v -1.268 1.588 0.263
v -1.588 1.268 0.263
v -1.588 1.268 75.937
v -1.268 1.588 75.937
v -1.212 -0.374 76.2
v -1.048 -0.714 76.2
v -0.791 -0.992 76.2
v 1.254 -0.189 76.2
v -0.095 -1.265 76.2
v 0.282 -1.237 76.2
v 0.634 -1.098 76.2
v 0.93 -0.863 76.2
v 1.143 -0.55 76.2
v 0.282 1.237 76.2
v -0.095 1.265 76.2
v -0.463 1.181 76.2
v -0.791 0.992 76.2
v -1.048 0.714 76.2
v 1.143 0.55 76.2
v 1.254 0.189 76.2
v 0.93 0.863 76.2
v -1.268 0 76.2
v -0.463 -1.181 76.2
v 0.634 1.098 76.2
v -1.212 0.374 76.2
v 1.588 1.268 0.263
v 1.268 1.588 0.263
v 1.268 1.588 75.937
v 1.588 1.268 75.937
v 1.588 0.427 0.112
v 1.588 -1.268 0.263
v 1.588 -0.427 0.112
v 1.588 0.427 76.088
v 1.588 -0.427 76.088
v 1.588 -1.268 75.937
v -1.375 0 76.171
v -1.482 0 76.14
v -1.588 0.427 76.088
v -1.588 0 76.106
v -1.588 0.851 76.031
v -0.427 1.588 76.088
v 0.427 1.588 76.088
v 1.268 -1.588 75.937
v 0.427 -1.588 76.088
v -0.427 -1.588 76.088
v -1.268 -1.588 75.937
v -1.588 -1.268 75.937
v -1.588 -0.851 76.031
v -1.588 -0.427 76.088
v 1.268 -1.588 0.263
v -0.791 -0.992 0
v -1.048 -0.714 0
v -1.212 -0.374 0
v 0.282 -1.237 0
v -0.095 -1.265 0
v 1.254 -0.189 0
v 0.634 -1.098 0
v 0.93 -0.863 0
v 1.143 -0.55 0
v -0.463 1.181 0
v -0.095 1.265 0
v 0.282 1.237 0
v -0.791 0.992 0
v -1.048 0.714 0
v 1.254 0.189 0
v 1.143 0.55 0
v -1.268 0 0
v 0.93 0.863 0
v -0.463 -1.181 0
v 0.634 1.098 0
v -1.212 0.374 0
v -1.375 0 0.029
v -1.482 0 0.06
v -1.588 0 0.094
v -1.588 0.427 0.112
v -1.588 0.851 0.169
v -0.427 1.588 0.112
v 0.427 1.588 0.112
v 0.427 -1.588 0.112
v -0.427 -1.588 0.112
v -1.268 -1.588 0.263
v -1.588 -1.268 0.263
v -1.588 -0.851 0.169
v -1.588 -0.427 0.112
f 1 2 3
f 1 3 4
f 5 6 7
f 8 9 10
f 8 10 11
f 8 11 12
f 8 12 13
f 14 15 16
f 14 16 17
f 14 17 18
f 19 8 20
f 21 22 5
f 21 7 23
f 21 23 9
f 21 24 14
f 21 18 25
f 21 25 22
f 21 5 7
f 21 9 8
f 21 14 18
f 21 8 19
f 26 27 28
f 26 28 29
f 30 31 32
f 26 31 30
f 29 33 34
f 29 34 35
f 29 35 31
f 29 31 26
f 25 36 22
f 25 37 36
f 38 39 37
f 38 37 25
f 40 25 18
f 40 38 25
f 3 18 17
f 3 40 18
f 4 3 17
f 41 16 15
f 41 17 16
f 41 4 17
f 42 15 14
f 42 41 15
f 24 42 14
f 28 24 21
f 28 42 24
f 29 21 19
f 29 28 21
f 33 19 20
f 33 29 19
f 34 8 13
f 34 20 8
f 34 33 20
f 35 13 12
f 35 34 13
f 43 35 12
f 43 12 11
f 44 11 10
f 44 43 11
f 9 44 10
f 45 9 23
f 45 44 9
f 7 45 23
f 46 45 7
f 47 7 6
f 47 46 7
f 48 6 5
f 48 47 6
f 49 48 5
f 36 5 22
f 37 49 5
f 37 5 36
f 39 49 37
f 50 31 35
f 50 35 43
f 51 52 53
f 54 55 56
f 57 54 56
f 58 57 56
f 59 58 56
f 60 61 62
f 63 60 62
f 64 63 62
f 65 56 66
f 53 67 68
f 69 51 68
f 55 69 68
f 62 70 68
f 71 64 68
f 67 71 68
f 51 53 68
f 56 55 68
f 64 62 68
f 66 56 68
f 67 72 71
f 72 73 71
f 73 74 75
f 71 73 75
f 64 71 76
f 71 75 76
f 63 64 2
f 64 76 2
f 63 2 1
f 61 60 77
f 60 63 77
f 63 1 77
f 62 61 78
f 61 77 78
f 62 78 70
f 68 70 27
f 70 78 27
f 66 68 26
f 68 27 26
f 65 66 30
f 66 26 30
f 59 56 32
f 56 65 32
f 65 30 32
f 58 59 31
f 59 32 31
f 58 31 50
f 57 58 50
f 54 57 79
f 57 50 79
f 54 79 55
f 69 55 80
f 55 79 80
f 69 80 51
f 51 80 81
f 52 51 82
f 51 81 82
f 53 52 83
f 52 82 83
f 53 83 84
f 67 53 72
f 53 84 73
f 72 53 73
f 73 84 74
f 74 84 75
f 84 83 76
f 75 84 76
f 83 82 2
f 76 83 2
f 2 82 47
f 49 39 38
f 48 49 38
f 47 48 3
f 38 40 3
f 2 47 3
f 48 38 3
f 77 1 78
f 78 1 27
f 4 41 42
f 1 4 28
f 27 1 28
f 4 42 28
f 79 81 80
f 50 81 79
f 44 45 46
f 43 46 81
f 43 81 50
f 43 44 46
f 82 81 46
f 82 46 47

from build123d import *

# Parameters (mm, degrees)
SKETCH1_W           = 3.175
SKETCH1_H           = 3.175
BOSS_EXTRUDE1_DEPTH = 38.1
SKETCH2_OUTSIDE_W   = 12.848
SKETCH2_OUTSIDE_H   = 12.847
SKETCH2_OUTSIDE_R   = 2.032
CUT_EXTRUDE1_DEPTH  = 39.1


with BuildPart() as part:
    # Sketch1 → Boss-Extrude1 (new body)
    with BuildSketch(Plane.XY):
        Rectangle(SKETCH1_W, SKETCH1_H)
    extrude(amount=BOSS_EXTRUDE1_DEPTH)

    # Sketch2 outside → Cut-Extrude1 (cut, through all)
    with BuildSketch(Plane(origin=(0, 0, 0), x_dir=(-1, 0, 0), z_dir=(0, 0, -1))):
        with Locations((0, -0.0005)):
            Rectangle(SKETCH2_OUTSIDE_W, SKETCH2_OUTSIDE_H)
        Circle(SKETCH2_OUTSIDE_R, mode=Mode.SUBTRACT)
    extrude(amount=-CUT_EXTRUDE1_DEPTH, mode=Mode.SUBTRACT)

    # Sketch3 → Cut-Revolve1 (revolve, cut)
    with BuildSketch(Plane(origin=(0, 0, 0), x_dir=(1, 0, 0), z_dir=(0, 1, 0))):
        with BuildLine():
            Line((-5.053685963, -4.40273269), (-5.053685963, 5.740530545))
            Line((-5.053685963, 5.740530545), (0, 5.740530545))
            Line((0, 5.740530545), (0, 0.160877736))
            ThreePointArc((0, 0.160877736), (-3.404639553, -1.148866368), (-5.053685963, -4.40273269))
        make_face()
    revolve(axis=Axis((0, 0, 38.1), (0, 0, -1)), mode=Mode.SUBTRACT)

    # Mirror1: part across plane


with BuildPart() as part_1:
    add(part.part)
    add(part.part.mirror(Plane(origin=(0, 0, 38.1), x_dir=(1, 0, 0), z_dir=(0, 0, -1))))


solid = part_1.part
